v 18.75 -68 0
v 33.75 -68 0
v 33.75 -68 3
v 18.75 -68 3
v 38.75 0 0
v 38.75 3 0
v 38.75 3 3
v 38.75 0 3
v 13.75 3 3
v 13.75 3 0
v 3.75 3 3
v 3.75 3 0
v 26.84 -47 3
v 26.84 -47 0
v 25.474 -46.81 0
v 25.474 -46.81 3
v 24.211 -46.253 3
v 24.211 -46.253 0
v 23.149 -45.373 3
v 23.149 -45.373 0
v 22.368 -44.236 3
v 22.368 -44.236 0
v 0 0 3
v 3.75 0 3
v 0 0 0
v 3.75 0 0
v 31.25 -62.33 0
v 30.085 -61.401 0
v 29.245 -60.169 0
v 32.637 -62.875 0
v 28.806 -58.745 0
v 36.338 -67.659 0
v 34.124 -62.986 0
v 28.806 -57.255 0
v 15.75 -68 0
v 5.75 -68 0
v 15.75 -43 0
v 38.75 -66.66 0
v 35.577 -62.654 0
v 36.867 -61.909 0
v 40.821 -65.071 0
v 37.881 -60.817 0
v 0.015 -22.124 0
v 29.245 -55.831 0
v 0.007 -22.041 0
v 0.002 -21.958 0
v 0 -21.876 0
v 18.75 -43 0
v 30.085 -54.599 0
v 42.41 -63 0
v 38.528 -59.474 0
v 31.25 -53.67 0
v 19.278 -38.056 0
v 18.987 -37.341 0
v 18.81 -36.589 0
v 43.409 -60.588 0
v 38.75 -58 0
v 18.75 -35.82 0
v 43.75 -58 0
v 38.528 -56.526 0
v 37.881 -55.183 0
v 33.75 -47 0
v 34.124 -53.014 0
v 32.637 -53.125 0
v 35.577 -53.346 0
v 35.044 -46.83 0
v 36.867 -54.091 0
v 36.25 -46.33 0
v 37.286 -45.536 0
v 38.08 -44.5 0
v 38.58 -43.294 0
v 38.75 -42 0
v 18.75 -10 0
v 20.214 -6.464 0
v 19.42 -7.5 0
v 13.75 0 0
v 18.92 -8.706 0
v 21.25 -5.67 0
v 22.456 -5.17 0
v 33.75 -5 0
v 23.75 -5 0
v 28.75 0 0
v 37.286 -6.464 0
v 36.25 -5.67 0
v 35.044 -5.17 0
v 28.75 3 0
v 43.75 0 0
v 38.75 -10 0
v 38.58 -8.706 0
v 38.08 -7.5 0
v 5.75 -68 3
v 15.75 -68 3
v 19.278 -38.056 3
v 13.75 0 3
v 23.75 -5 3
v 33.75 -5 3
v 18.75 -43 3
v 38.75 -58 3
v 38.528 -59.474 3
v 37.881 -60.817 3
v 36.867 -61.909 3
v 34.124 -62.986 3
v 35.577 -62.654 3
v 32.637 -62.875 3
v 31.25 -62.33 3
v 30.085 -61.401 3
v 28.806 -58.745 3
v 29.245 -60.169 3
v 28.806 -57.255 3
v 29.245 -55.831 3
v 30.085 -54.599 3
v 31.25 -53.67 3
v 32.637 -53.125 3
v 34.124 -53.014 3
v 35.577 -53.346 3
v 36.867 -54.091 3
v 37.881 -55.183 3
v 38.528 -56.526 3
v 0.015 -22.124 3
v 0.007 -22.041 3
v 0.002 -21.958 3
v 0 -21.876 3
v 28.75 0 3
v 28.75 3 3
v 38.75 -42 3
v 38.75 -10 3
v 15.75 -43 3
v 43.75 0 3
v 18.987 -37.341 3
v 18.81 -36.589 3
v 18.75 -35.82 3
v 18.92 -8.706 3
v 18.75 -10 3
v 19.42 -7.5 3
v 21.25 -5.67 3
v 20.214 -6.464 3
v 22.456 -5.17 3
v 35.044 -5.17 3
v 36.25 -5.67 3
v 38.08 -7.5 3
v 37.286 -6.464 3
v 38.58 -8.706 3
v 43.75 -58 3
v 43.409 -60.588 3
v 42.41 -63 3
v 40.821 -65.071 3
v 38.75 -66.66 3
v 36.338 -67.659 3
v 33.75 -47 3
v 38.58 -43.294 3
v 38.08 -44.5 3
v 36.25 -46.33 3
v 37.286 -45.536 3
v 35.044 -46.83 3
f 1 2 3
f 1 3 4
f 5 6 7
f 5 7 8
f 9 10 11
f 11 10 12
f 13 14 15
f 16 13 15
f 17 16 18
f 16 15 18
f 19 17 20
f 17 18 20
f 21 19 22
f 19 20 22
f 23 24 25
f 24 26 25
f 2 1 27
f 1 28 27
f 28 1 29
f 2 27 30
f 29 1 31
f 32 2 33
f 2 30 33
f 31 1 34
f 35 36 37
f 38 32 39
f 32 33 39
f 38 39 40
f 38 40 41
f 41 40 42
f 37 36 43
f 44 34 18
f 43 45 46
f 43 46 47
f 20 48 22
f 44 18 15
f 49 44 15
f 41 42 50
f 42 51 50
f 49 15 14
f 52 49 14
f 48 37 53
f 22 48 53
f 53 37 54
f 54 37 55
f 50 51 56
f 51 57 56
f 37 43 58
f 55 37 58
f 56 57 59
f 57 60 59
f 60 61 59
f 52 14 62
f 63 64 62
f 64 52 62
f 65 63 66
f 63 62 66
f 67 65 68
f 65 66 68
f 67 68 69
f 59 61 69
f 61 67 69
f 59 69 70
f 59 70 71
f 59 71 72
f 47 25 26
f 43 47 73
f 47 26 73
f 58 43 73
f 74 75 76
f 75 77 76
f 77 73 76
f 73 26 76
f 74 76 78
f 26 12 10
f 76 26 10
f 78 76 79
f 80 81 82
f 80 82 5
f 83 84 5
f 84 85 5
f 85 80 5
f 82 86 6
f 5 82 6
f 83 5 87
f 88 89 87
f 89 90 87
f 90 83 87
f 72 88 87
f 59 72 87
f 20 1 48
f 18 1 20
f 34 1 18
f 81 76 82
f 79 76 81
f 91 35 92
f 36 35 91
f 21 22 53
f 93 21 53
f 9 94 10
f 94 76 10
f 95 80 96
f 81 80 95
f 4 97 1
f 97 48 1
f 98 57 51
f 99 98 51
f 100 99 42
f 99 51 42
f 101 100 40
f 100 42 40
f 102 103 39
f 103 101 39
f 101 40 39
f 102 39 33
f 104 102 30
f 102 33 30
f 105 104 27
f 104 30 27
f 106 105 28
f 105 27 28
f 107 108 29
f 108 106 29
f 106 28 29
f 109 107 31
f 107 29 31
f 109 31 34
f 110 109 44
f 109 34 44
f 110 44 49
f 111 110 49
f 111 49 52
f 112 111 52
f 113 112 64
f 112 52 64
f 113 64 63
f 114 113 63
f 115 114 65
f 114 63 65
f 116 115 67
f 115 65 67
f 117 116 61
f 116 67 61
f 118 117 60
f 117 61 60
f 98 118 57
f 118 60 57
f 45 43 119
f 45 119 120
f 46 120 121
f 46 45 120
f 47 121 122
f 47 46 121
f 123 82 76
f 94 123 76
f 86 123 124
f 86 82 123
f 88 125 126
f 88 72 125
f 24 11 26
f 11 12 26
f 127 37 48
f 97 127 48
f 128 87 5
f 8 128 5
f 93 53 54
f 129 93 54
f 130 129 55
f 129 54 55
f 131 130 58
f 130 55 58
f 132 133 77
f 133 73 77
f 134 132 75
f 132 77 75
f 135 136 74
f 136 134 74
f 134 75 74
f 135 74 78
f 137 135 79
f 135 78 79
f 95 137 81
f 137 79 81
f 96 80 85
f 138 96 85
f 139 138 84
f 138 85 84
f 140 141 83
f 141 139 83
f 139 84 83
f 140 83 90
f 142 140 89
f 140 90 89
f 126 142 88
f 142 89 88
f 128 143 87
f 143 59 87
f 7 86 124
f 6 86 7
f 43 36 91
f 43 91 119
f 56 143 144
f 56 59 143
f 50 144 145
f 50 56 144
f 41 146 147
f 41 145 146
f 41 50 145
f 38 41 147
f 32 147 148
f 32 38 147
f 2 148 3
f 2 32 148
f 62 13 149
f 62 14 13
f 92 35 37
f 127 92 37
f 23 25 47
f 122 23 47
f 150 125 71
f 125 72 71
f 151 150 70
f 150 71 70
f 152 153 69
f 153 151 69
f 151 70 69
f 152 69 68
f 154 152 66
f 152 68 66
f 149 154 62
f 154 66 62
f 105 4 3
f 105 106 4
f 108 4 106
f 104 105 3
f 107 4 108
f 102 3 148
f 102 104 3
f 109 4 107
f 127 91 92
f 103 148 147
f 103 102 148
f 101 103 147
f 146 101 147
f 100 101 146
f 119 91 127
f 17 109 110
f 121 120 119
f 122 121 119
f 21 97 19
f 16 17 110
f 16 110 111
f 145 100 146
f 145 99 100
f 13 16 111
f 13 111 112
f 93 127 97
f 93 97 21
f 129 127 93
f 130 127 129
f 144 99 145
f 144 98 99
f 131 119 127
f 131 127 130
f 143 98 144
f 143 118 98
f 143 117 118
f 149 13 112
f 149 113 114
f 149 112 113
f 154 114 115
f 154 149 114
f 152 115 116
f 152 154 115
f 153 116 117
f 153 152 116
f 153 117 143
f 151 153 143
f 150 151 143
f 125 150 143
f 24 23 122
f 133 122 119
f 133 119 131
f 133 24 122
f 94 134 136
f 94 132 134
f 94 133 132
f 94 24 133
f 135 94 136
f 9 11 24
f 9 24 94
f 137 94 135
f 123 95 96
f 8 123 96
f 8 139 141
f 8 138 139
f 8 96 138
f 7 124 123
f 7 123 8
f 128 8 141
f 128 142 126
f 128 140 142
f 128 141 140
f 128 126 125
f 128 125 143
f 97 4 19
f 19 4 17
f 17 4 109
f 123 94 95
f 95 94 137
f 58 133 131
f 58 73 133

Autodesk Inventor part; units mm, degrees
ref_plane "YZ Plane" through (0, 0, 0) normal (1, 0, 0) x (0, 1, 0)
ref_plane "XZ Plane" through (0, 0, 0) normal (0, 1, 0) x (-1, 0, 0)
ref_plane "XY Plane" through (0, 0, 0) normal (0, 0, 1) x (1, 0, 0)
sketch "Sketch1" plane through (0, 0, 0) normal (0, 0, 1) x (1, 0, 0)
  line L0 (15.75, -68) -> (15.75, -43)
  line L1 (15.75, -43) -> (18.75, -43)
  line L2 (18.75, -43) -> (18.75, -68)
  line L3 (43.75, -58) -> (43.75, 0)
  arc A0 (33.75, -68) -> (43.75, -58) centre (33.75, -58) ccw
  circle A1 centre (33.75, -58) radius 5
  line L4 (13.75, 0) -> (13.75, 3)
  line L5 (13.75, 3) -> (3.75, 3)
  line L6 (3.75, 3) -> (3.75, 0)
  line L7 (28.75, 0) -> (28.75, 3)
  line L8 (28.75, 3) -> (38.75, 3)
  line L9 (38.75, 3) -> (38.75, 0)
  line L10 (43.75, 0) -> (38.75, 0)
  line L11 (28.75, 0) -> (13.75, 0)
  line L12 (3.75, 0) -> (0, 0)
  line L13 (0, 0) -> (0, -21.8755)
  line L14 (5.75, -68) -> (0.0154, -22.1236)
  arc A2 (0, -21.8755) -> (0.0154, -22.1236) centre (2, -21.8755) ccw
  line L15 (33.75, -68) -> (18.75, -68)
  line L16 (15.75, -68) -> (5.75, -68)
  line L17 (26.8402, -47) -> (33.75, -47)
  line L18 (38.75, -42) -> (38.75, -10)
  line L19 (22.368, -44.2361) -> (19.2779, -38.0557)
  line L20 (33.75, -5) -> (23.75, -5)
  line L21 (18.75, -10) -> (18.75, -35.8197)
  arc A3 (23.75, -5) -> (18.75, -10) centre (23.75, -10) ccw
  arc A4 (38.75, -10) -> (33.75, -5) centre (33.75, -10) ccw
  arc A5 (33.75, -47) -> (38.75, -42) centre (33.75, -42) ccw
  arc A6 (22.368, -44.2361) -> (26.8402, -47) centre (26.8402, -42) ccw
  arc A7 (18.75, -35.8197) -> (19.2779, -38.0557) centre (23.75, -35.8197) ccw
  point P0 (43.75, -69.5)
  point P1 (0, -22)
  point P2 (23.75, -47)
  point P3 (18.75, -37)
  dimension "d7" = 10
  dimension "d12" = 10
  dimension "d17" = 10
  dimension "d18" = 3
  dimension "d20" = 10
  dimension "d21" = 3
  dimension "d22" = 5
  dimension "d23" = 15
  dimension "d24" = 3
  dimension "d25" = 3
  dimension "d42" = 3
  dimension "d46" = 3.75
  dimension "d47" = 22
  dimension "d49" = 2
  dimension "d54" = 10
  dimension "d55" = 15
  dimension "d57" = 68
  dimension "d58" = 15.75
  dimension "d59" = 25
  dimension "d61" = 5
  dimension "d65" = 5
  dimension "d66" = 10
  dimension "d67" = 5
  dimension "d68" = 5
extrude "Extrusion2" add sketch "Sketch1" along normal blind 3
properties part number "OpenROV 2_3 Dev Handle1"
